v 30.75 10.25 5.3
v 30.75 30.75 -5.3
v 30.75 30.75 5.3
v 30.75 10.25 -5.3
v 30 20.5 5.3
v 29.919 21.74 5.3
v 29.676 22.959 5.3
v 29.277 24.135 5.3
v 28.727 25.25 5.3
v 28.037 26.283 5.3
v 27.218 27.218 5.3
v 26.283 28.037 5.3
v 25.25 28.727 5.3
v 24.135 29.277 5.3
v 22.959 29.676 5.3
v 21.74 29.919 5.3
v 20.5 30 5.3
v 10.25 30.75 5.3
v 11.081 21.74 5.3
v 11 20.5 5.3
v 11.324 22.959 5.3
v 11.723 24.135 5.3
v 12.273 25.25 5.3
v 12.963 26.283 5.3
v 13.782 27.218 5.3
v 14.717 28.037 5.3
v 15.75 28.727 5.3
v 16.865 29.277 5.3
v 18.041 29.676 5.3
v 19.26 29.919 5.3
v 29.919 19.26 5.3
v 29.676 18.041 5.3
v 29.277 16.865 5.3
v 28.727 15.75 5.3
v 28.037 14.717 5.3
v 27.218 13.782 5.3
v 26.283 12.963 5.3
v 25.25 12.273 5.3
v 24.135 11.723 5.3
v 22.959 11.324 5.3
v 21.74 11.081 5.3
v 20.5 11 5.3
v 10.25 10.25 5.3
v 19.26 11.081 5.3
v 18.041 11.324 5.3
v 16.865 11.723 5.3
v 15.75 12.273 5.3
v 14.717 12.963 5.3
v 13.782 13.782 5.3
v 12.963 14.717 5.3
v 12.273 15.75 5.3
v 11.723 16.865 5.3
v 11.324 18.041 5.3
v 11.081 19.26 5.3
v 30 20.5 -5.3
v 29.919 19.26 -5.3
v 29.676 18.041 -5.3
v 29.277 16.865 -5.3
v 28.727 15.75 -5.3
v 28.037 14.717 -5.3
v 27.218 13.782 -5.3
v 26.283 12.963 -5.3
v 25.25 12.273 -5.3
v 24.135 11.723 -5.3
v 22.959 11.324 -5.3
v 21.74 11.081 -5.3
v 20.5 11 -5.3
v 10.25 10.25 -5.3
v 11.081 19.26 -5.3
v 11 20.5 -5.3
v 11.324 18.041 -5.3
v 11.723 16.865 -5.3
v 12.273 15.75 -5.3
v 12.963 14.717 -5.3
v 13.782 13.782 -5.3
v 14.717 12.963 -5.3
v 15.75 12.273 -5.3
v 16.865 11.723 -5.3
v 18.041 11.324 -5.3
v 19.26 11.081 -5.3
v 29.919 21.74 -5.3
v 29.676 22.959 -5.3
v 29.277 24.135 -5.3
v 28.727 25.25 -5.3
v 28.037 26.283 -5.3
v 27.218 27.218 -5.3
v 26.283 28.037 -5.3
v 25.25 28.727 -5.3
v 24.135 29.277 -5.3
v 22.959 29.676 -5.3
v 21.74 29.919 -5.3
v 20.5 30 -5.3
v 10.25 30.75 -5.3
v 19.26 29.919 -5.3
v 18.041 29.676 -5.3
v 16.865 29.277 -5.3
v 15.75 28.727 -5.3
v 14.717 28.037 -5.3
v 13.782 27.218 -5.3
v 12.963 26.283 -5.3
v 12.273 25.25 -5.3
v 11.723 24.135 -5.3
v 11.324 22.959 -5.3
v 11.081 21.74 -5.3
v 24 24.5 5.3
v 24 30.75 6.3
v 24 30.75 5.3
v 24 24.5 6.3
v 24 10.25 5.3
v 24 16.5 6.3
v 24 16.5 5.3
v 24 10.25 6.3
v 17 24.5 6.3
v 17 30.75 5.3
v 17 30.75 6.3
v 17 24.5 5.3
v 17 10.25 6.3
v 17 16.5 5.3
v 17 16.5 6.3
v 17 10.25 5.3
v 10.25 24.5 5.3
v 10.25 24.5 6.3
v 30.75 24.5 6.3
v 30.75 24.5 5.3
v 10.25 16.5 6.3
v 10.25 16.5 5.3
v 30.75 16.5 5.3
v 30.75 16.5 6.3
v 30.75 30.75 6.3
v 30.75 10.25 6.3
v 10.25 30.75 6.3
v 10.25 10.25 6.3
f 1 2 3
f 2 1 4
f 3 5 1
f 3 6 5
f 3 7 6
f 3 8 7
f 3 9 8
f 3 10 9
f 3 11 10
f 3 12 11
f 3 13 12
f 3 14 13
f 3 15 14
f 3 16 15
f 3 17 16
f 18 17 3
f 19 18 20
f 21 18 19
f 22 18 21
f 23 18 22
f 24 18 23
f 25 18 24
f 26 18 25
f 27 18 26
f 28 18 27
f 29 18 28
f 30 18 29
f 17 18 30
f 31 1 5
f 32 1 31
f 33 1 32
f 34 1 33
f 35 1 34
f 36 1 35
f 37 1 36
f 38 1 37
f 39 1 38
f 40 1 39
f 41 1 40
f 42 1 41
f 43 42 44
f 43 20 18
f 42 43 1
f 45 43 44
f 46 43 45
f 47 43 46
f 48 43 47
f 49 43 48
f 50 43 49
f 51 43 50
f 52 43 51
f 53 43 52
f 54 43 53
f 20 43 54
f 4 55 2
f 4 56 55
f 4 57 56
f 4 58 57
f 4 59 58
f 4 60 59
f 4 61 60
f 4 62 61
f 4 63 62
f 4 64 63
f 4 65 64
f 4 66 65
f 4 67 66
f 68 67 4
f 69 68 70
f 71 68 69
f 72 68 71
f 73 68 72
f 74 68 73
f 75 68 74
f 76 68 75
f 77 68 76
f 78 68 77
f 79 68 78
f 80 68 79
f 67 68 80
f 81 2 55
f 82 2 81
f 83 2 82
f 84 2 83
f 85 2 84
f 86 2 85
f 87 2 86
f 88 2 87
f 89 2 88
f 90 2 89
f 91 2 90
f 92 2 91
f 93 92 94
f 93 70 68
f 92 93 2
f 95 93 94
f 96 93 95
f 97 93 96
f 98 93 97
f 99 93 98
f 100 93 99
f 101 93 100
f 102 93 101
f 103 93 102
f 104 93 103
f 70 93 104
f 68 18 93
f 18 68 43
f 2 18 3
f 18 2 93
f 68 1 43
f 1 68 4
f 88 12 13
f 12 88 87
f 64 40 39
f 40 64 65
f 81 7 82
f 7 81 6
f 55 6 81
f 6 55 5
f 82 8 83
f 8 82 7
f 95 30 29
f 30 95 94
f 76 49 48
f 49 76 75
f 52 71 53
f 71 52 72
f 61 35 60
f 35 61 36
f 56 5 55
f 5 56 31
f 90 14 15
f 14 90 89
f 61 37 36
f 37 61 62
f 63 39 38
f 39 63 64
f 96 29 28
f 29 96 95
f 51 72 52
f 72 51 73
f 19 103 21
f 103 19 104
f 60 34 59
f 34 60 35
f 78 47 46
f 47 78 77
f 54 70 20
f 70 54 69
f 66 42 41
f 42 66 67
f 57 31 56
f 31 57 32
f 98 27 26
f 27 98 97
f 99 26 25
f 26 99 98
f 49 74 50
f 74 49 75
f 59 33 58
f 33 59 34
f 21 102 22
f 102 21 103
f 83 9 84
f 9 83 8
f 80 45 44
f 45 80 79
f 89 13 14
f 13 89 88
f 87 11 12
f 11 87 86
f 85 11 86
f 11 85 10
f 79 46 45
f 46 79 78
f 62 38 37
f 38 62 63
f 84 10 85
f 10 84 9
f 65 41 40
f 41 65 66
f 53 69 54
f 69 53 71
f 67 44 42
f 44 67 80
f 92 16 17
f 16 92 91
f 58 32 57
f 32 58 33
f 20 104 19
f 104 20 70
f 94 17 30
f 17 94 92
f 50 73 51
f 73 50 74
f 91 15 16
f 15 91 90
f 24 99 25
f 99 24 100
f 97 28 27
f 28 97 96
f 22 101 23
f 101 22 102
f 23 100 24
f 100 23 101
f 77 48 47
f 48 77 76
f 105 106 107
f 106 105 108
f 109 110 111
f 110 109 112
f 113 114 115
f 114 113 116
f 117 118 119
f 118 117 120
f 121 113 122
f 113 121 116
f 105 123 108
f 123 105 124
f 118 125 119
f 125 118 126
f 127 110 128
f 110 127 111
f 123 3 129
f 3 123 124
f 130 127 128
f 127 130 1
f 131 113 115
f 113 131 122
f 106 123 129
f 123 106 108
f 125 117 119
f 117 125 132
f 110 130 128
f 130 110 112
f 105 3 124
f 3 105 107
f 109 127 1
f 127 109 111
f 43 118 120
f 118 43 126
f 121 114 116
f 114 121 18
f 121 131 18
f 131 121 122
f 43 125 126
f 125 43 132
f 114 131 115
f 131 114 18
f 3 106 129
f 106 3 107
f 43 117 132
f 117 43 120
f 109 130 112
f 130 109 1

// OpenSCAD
// 

// Cell diameter (usually 18.7, some cell varies)
cell_diameter = 19;
// Cell Holder Height
height=10.6;

// Cell Spacing
cell_space = 1.5; 
// Number of rows
x_size = 1; // [1:20]
// Number of columns
y_size = 1; // [1:20]

//Support height
base_h=1;
//Nickel tab width in rows
x_strip_width= 7; 
//Nicel tab width in cols
y_strip_width= 8; 


calc_cell_space = cell_diameter + cell_space;
// number of faces in circle
$fn=48; 

for ( i = [1 : y_size] )
{
    translate([0,i*(calc_cell_space),0])
        for ( i = [1 : x_size] )
        {
            translate([i*(calc_cell_space),0,0])                             
                difference()
                {                      
                    cube(size = [calc_cell_space,calc_cell_space,height], center = true);                    
                        cylinder(h = height+0.01, r=cell_diameter/2,center=true);                                                                        
                }  
                
            translate([i*(calc_cell_space),0,(base_h/2) +(height/2) ])                             
                difference()
                {                   
                    cube(size = [calc_cell_space,calc_cell_space,base_h], center = true);
                    union()
                        {                        
                            cube(size = [x_strip_width,calc_cell_space+1,base_h+0.01], center = true);                       
                            cube(size = [calc_cell_space+1,y_strip_width,base_h+0.01], center = true);                             
                        }
                }                                  
        }
}
